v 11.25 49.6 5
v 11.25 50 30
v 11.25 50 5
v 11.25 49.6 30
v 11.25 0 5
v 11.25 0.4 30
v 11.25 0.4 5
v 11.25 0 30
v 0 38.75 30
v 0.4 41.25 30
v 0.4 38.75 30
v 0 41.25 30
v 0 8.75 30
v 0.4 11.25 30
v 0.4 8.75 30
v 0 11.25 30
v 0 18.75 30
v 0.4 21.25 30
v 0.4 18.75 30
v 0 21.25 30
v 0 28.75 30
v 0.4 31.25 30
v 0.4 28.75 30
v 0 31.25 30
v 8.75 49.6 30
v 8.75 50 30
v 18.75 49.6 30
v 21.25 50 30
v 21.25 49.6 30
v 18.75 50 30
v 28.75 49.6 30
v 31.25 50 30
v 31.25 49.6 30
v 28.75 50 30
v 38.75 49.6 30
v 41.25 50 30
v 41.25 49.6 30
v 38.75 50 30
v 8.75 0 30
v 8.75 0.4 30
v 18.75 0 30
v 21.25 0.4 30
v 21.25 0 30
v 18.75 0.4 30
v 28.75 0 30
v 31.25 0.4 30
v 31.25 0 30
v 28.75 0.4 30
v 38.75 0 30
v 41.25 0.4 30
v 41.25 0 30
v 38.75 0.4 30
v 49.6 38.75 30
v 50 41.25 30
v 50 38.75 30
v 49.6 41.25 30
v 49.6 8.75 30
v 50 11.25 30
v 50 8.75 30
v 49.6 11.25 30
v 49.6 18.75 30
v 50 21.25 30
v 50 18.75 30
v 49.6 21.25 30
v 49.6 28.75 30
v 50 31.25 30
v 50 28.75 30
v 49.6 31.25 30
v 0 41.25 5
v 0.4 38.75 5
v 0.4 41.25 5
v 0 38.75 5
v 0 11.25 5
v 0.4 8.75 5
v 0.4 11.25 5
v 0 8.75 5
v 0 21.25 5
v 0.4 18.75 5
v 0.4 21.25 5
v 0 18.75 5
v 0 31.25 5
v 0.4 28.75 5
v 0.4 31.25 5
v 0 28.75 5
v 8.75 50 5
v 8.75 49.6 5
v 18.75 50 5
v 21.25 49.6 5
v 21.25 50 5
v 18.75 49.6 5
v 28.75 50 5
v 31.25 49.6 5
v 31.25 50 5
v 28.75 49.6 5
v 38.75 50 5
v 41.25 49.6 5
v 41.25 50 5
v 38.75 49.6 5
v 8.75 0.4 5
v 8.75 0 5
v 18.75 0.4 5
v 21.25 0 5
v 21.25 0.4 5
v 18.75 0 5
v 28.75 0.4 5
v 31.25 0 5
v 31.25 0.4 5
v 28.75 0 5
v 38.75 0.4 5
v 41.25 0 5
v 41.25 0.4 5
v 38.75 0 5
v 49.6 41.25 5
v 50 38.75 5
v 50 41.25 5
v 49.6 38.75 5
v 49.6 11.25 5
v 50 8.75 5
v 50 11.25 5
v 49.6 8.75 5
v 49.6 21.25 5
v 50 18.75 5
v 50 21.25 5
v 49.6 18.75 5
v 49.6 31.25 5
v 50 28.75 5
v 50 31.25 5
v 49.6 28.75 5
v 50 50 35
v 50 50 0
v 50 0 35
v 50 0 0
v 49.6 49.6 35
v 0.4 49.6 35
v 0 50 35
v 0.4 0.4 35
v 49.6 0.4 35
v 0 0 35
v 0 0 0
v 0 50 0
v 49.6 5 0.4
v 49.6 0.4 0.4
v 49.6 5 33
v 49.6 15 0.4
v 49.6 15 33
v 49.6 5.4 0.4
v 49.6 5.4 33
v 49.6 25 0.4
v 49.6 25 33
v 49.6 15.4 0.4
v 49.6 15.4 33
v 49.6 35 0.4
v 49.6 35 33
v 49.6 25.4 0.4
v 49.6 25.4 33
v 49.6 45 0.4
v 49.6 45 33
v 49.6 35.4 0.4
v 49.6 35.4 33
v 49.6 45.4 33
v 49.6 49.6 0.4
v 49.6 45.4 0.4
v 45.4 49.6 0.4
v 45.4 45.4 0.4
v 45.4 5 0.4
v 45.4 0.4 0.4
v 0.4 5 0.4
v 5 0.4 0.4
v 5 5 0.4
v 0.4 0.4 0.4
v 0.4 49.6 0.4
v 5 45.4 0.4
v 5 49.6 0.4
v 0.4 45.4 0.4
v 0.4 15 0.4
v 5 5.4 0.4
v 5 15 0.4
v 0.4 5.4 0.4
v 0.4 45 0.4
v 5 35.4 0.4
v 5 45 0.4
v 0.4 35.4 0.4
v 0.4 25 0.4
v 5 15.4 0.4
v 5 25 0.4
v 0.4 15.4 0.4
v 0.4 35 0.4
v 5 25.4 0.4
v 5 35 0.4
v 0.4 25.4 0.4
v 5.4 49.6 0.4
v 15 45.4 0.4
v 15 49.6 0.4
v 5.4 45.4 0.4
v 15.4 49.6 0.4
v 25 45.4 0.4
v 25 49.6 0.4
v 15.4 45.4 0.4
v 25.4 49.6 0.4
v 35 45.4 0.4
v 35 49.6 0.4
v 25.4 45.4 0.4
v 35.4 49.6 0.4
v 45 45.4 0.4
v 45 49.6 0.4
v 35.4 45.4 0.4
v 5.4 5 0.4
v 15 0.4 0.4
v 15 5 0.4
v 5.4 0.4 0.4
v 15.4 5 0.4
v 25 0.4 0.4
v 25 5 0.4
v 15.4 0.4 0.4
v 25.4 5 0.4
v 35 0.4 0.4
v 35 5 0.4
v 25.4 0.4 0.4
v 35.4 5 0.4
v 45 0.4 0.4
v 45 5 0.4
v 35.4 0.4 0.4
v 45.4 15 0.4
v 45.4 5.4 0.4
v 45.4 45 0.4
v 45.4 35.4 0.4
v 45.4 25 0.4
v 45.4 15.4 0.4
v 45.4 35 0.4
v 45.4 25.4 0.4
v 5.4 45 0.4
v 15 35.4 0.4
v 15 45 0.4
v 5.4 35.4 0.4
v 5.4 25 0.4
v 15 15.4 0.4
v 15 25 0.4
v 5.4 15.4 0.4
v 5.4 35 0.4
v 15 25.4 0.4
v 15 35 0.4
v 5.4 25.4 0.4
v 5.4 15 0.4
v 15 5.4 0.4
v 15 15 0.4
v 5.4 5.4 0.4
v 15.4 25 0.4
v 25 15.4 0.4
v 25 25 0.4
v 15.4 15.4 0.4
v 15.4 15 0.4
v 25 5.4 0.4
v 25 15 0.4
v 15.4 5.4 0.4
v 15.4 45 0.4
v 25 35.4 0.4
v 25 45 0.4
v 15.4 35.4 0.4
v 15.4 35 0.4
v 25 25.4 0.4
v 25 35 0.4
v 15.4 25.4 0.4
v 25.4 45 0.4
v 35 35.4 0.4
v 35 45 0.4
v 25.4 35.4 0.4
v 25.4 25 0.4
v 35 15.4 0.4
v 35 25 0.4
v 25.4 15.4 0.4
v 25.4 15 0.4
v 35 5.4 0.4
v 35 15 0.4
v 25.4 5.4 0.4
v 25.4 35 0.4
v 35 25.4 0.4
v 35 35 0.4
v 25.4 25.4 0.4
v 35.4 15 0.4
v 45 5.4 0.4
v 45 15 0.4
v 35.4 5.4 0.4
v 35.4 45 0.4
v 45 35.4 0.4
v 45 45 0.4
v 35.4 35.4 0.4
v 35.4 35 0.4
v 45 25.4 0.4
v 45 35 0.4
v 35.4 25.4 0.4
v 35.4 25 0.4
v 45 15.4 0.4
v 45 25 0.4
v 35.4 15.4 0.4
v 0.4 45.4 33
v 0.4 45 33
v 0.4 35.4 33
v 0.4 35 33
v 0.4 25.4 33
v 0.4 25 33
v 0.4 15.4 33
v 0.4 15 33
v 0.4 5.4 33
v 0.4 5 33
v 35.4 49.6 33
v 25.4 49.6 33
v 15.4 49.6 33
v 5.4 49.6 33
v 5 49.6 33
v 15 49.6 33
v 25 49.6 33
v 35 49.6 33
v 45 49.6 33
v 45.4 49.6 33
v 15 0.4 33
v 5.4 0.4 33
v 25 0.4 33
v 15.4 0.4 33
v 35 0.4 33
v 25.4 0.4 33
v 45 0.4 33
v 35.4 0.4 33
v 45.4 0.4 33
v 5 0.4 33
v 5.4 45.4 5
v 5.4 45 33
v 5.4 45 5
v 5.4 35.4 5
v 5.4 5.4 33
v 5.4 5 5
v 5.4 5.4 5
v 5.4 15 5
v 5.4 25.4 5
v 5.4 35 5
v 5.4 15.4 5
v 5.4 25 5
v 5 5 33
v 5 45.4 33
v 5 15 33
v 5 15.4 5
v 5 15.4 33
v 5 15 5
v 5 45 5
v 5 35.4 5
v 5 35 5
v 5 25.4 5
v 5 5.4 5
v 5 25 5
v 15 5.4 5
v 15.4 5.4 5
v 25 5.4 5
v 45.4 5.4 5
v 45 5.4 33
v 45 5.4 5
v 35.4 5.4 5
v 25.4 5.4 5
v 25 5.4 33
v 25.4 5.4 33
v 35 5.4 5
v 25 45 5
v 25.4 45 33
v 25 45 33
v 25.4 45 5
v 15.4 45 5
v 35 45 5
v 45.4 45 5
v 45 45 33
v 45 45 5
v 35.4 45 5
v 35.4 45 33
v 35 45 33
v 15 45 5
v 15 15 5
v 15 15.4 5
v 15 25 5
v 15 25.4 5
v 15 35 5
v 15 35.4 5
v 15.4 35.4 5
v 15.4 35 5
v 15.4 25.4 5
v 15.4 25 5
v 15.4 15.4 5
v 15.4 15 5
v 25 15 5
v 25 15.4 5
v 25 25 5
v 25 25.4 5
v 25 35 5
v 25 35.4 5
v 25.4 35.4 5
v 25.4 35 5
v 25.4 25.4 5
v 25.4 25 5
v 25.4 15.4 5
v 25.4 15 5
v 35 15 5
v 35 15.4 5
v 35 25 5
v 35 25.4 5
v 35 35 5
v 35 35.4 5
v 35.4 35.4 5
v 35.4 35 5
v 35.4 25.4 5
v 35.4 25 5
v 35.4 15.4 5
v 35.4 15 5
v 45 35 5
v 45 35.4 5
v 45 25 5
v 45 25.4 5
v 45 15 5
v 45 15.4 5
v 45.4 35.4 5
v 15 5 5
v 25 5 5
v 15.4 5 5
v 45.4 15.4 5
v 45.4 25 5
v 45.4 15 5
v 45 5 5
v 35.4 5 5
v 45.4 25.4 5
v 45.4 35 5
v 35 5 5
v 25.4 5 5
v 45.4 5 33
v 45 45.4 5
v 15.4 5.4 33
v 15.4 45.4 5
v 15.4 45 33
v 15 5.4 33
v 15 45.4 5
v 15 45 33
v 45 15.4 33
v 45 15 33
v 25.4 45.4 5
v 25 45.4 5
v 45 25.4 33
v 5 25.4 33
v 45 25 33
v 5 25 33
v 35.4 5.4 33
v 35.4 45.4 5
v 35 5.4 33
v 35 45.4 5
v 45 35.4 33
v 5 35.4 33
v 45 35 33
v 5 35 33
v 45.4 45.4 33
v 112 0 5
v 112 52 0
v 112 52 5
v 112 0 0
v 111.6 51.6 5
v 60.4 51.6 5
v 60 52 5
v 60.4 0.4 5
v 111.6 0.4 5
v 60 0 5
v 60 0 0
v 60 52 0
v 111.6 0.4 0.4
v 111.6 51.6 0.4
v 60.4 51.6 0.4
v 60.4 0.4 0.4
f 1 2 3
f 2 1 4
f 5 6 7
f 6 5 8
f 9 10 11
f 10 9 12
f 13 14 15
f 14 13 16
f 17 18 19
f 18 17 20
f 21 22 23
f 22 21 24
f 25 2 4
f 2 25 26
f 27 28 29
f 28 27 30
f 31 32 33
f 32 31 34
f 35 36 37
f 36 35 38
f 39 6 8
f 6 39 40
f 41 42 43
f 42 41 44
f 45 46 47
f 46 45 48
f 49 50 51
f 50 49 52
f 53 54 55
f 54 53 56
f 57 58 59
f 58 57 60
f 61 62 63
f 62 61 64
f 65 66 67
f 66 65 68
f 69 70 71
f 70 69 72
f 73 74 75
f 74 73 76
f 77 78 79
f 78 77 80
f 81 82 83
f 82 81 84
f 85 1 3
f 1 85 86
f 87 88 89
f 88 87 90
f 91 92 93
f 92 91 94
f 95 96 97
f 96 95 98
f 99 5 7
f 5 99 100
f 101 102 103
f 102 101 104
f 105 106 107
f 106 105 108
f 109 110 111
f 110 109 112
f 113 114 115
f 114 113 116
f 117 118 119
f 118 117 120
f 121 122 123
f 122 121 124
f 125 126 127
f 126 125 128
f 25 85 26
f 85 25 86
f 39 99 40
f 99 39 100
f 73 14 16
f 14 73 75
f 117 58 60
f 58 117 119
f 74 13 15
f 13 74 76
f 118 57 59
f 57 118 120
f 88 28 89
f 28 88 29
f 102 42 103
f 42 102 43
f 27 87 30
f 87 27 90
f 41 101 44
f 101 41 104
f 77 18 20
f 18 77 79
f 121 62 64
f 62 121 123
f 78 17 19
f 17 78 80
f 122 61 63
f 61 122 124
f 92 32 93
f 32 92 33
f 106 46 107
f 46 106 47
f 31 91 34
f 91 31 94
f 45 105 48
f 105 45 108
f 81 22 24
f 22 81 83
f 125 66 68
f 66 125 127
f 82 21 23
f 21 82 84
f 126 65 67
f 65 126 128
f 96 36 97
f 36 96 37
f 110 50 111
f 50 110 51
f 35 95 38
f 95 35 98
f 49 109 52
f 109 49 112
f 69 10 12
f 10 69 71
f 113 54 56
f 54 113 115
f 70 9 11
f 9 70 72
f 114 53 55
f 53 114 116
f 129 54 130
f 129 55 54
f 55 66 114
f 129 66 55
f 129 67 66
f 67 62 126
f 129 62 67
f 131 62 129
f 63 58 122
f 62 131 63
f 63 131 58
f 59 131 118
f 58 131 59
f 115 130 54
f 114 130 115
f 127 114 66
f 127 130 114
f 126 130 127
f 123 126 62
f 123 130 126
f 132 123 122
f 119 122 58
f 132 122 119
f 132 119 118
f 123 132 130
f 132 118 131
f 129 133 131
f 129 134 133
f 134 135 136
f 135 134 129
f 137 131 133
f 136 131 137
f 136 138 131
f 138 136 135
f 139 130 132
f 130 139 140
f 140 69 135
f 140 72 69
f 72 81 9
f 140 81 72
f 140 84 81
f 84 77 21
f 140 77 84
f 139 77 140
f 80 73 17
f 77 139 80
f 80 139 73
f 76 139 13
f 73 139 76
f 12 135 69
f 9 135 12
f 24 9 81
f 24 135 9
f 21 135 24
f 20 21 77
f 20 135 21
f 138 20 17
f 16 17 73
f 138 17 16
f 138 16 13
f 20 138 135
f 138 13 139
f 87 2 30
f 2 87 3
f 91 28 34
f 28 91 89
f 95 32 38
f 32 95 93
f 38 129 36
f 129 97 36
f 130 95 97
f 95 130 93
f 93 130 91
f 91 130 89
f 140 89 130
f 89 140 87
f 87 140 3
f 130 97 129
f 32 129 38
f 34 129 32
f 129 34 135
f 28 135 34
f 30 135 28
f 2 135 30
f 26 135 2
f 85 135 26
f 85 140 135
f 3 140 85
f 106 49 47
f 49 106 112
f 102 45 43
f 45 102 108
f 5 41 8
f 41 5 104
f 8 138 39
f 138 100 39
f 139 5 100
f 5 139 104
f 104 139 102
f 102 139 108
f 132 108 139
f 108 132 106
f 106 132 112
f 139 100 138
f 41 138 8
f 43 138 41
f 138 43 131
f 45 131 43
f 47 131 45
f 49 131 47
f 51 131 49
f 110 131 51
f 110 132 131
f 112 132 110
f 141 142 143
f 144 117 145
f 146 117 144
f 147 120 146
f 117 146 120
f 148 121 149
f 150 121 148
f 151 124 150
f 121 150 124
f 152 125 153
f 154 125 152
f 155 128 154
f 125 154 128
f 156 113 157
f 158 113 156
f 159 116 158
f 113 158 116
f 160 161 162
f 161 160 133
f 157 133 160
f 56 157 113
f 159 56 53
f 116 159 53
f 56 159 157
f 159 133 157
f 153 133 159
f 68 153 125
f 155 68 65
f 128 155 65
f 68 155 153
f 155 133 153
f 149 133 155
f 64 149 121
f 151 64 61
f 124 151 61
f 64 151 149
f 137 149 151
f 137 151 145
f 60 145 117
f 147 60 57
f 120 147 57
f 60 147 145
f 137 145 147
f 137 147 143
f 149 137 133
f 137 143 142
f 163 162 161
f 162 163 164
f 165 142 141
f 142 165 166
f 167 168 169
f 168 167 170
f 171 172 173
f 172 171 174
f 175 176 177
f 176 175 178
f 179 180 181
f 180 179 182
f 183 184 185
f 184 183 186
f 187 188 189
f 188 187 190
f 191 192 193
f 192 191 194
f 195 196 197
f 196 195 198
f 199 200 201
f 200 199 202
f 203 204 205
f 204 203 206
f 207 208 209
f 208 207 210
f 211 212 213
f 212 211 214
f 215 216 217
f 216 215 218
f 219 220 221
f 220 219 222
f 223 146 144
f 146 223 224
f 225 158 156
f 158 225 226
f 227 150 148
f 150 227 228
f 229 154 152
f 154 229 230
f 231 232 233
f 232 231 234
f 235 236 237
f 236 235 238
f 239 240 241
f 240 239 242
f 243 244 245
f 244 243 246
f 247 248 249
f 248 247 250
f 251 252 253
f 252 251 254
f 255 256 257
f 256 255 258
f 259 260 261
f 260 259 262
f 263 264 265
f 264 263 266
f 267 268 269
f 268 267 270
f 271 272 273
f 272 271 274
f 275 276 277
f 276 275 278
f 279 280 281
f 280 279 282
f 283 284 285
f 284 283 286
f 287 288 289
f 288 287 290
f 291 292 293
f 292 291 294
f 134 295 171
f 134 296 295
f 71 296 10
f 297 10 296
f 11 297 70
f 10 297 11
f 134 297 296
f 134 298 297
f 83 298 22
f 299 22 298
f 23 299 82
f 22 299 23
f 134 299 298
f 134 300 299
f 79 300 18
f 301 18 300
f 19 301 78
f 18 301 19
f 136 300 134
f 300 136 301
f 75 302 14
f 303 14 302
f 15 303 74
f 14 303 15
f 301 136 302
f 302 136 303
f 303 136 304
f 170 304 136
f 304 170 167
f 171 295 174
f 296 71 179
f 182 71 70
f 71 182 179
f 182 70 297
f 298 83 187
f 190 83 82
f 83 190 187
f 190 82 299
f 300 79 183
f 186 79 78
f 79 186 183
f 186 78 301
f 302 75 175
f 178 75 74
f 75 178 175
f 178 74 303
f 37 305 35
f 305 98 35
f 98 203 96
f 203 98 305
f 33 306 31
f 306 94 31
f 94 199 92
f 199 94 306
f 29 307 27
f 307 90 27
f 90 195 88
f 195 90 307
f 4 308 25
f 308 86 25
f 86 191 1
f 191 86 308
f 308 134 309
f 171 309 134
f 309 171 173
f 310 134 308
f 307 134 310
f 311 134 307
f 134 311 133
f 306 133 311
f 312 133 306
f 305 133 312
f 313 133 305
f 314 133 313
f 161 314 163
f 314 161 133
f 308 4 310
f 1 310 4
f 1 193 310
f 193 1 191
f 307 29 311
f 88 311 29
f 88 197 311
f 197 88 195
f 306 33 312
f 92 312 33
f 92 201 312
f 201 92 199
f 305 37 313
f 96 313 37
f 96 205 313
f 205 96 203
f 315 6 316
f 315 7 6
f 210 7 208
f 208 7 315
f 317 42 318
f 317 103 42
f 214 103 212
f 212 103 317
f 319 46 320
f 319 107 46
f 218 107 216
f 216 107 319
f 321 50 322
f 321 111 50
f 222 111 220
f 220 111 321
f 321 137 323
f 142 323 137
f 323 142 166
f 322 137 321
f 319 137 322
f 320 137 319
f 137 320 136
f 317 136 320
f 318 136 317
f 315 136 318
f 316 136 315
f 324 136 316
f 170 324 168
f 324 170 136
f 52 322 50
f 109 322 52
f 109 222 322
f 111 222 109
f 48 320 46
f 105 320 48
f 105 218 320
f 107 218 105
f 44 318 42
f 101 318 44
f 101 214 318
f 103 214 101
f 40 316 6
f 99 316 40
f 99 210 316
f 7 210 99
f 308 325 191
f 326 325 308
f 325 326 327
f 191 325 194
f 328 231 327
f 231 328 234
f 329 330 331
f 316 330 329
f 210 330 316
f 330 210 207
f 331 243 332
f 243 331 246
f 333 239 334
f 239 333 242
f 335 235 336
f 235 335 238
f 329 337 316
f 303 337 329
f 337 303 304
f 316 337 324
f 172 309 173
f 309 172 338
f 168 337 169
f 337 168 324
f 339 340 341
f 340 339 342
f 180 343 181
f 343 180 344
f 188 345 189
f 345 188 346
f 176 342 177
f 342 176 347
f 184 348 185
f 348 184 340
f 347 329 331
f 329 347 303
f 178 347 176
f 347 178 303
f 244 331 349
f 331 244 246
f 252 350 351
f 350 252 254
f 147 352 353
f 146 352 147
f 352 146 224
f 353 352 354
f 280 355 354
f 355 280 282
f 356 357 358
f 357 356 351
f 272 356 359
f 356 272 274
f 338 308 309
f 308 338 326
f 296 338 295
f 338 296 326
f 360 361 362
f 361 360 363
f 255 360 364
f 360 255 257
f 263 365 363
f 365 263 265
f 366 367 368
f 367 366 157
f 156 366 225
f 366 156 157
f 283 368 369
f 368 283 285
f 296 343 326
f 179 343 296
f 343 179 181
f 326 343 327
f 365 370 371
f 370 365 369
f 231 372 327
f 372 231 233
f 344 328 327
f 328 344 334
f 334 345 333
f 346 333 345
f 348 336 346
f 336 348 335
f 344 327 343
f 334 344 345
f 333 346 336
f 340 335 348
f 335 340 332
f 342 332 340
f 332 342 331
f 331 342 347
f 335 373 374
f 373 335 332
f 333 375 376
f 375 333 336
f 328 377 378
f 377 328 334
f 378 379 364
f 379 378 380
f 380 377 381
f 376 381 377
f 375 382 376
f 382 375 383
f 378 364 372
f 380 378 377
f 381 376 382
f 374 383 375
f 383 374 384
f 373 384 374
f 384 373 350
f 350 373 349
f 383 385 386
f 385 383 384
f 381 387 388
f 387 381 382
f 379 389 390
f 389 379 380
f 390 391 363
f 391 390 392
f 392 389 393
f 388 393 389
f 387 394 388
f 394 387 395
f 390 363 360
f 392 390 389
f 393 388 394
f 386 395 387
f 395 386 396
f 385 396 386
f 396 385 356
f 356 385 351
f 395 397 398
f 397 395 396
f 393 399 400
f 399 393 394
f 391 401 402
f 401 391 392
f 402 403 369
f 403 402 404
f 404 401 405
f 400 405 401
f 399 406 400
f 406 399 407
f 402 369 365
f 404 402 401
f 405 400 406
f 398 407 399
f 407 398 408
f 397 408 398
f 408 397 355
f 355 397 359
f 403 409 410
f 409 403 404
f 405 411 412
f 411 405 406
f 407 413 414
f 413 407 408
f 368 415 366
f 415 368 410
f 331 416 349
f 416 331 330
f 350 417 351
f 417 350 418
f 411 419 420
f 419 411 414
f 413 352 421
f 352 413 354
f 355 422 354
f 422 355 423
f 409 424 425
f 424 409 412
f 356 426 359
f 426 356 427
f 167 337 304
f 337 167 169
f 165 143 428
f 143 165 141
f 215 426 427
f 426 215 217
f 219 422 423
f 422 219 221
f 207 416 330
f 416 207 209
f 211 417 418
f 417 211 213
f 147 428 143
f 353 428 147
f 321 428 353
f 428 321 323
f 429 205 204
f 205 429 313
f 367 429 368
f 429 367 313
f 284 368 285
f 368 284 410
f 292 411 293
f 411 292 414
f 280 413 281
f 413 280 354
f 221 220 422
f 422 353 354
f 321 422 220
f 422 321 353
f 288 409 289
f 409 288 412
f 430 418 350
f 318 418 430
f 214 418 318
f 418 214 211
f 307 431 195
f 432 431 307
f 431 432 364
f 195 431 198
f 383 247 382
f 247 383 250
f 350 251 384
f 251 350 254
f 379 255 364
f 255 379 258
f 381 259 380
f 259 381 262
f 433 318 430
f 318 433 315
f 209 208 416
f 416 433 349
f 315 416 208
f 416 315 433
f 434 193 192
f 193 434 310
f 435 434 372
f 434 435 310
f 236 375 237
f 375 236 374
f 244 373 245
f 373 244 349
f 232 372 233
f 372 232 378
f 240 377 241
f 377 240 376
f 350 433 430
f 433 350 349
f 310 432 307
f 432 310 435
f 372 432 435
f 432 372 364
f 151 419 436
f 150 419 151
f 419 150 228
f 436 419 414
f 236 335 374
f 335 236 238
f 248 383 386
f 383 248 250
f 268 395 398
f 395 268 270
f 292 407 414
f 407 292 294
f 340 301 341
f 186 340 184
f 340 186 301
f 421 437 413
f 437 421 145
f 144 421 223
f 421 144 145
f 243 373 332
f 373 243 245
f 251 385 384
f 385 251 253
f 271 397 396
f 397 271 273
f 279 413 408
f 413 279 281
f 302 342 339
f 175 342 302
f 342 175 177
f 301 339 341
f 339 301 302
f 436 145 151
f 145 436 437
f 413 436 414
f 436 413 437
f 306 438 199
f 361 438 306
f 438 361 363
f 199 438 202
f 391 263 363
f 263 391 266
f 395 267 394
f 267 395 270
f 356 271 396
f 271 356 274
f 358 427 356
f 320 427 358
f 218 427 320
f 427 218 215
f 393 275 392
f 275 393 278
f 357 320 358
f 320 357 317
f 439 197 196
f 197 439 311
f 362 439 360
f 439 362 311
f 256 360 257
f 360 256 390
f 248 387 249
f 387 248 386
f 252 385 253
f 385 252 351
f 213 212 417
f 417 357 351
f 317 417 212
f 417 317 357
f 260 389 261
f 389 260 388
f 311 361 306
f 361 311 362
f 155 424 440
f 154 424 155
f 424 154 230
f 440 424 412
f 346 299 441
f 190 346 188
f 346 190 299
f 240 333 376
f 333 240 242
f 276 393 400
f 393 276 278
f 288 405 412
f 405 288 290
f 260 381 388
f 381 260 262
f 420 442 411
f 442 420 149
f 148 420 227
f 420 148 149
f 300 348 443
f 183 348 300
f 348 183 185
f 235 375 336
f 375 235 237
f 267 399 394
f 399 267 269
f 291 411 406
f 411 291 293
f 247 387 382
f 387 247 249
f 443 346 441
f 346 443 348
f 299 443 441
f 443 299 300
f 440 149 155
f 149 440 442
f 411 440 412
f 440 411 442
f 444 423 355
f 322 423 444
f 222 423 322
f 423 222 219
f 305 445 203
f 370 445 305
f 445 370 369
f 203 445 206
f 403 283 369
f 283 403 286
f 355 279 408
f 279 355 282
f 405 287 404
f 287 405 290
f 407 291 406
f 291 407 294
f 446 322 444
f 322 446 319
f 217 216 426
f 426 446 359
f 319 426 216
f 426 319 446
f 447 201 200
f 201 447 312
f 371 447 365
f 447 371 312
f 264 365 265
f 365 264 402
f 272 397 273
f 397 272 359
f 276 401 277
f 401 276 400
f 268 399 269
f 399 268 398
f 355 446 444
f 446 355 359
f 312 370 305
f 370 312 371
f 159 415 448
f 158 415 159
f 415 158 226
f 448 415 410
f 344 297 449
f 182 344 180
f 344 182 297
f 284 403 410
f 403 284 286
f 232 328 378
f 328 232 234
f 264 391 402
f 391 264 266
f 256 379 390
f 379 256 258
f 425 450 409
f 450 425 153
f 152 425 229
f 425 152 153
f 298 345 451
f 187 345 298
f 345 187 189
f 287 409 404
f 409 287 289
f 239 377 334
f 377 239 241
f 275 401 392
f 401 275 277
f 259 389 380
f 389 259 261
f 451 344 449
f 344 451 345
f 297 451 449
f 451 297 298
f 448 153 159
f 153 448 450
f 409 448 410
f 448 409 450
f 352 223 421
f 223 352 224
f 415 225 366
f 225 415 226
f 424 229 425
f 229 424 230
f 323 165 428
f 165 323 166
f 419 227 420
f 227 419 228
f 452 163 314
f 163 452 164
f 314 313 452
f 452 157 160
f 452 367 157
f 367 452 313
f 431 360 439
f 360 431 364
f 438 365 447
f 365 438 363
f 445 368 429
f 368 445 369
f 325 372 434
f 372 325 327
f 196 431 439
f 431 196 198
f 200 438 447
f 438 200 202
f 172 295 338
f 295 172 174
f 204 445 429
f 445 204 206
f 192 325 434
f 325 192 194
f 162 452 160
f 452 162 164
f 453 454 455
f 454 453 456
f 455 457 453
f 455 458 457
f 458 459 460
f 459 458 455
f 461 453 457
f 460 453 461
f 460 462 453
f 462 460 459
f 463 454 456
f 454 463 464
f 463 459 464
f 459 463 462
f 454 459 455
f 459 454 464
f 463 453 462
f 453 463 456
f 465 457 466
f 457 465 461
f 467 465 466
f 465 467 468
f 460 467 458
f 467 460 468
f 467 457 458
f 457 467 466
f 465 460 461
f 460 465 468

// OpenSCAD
aa = 50; // size of cube
bb = 35; // height of box
ss = 0.4; // wall thickness
gap =0.6; // gap betwin box and cover
dir = 2.5; // slit thickness

difference(){

    
    cube([aa,aa,bb]);
    
    translate([ss,ss,ss])
    cube([aa-ss*2,aa-ss*2,bb]);
    

  for (i=[10:10:aa-5]){
//      
      translate([i-dir/2,-5,5])    
      cube([dir,aa+10,bb-10]);
      
      translate([-5,i-dir/2,5])    
      cube([aa+10,dir,bb-10]);
 
      }  
 
}

for (i =[5:10:aa]) {
    
translate([i,0,0])
cube([ss,5+ss,bb-2]);
    
translate([i,aa-5,0])
cube([ss,5,bb-2]);  
    
translate([i,0,0])
cube([ss,aa,5]);
    
translate([0,i,0])
cube([aa,ss,5]);   
    
translate([0,i,0])
cube([5,ss,bb-2]);    

translate([aa-5,i,0])
cube([5,ss,bb-2]);    
    
        
    
}


translate([aa+10,0,0]){
    difference(){
cube([aa+ss*2+gap*2,aa+ss*2+gap*2,5]);


translate([ss,ss,ss])   
cube([aa+gap*2,aa+gap*2,5]);
}

}
